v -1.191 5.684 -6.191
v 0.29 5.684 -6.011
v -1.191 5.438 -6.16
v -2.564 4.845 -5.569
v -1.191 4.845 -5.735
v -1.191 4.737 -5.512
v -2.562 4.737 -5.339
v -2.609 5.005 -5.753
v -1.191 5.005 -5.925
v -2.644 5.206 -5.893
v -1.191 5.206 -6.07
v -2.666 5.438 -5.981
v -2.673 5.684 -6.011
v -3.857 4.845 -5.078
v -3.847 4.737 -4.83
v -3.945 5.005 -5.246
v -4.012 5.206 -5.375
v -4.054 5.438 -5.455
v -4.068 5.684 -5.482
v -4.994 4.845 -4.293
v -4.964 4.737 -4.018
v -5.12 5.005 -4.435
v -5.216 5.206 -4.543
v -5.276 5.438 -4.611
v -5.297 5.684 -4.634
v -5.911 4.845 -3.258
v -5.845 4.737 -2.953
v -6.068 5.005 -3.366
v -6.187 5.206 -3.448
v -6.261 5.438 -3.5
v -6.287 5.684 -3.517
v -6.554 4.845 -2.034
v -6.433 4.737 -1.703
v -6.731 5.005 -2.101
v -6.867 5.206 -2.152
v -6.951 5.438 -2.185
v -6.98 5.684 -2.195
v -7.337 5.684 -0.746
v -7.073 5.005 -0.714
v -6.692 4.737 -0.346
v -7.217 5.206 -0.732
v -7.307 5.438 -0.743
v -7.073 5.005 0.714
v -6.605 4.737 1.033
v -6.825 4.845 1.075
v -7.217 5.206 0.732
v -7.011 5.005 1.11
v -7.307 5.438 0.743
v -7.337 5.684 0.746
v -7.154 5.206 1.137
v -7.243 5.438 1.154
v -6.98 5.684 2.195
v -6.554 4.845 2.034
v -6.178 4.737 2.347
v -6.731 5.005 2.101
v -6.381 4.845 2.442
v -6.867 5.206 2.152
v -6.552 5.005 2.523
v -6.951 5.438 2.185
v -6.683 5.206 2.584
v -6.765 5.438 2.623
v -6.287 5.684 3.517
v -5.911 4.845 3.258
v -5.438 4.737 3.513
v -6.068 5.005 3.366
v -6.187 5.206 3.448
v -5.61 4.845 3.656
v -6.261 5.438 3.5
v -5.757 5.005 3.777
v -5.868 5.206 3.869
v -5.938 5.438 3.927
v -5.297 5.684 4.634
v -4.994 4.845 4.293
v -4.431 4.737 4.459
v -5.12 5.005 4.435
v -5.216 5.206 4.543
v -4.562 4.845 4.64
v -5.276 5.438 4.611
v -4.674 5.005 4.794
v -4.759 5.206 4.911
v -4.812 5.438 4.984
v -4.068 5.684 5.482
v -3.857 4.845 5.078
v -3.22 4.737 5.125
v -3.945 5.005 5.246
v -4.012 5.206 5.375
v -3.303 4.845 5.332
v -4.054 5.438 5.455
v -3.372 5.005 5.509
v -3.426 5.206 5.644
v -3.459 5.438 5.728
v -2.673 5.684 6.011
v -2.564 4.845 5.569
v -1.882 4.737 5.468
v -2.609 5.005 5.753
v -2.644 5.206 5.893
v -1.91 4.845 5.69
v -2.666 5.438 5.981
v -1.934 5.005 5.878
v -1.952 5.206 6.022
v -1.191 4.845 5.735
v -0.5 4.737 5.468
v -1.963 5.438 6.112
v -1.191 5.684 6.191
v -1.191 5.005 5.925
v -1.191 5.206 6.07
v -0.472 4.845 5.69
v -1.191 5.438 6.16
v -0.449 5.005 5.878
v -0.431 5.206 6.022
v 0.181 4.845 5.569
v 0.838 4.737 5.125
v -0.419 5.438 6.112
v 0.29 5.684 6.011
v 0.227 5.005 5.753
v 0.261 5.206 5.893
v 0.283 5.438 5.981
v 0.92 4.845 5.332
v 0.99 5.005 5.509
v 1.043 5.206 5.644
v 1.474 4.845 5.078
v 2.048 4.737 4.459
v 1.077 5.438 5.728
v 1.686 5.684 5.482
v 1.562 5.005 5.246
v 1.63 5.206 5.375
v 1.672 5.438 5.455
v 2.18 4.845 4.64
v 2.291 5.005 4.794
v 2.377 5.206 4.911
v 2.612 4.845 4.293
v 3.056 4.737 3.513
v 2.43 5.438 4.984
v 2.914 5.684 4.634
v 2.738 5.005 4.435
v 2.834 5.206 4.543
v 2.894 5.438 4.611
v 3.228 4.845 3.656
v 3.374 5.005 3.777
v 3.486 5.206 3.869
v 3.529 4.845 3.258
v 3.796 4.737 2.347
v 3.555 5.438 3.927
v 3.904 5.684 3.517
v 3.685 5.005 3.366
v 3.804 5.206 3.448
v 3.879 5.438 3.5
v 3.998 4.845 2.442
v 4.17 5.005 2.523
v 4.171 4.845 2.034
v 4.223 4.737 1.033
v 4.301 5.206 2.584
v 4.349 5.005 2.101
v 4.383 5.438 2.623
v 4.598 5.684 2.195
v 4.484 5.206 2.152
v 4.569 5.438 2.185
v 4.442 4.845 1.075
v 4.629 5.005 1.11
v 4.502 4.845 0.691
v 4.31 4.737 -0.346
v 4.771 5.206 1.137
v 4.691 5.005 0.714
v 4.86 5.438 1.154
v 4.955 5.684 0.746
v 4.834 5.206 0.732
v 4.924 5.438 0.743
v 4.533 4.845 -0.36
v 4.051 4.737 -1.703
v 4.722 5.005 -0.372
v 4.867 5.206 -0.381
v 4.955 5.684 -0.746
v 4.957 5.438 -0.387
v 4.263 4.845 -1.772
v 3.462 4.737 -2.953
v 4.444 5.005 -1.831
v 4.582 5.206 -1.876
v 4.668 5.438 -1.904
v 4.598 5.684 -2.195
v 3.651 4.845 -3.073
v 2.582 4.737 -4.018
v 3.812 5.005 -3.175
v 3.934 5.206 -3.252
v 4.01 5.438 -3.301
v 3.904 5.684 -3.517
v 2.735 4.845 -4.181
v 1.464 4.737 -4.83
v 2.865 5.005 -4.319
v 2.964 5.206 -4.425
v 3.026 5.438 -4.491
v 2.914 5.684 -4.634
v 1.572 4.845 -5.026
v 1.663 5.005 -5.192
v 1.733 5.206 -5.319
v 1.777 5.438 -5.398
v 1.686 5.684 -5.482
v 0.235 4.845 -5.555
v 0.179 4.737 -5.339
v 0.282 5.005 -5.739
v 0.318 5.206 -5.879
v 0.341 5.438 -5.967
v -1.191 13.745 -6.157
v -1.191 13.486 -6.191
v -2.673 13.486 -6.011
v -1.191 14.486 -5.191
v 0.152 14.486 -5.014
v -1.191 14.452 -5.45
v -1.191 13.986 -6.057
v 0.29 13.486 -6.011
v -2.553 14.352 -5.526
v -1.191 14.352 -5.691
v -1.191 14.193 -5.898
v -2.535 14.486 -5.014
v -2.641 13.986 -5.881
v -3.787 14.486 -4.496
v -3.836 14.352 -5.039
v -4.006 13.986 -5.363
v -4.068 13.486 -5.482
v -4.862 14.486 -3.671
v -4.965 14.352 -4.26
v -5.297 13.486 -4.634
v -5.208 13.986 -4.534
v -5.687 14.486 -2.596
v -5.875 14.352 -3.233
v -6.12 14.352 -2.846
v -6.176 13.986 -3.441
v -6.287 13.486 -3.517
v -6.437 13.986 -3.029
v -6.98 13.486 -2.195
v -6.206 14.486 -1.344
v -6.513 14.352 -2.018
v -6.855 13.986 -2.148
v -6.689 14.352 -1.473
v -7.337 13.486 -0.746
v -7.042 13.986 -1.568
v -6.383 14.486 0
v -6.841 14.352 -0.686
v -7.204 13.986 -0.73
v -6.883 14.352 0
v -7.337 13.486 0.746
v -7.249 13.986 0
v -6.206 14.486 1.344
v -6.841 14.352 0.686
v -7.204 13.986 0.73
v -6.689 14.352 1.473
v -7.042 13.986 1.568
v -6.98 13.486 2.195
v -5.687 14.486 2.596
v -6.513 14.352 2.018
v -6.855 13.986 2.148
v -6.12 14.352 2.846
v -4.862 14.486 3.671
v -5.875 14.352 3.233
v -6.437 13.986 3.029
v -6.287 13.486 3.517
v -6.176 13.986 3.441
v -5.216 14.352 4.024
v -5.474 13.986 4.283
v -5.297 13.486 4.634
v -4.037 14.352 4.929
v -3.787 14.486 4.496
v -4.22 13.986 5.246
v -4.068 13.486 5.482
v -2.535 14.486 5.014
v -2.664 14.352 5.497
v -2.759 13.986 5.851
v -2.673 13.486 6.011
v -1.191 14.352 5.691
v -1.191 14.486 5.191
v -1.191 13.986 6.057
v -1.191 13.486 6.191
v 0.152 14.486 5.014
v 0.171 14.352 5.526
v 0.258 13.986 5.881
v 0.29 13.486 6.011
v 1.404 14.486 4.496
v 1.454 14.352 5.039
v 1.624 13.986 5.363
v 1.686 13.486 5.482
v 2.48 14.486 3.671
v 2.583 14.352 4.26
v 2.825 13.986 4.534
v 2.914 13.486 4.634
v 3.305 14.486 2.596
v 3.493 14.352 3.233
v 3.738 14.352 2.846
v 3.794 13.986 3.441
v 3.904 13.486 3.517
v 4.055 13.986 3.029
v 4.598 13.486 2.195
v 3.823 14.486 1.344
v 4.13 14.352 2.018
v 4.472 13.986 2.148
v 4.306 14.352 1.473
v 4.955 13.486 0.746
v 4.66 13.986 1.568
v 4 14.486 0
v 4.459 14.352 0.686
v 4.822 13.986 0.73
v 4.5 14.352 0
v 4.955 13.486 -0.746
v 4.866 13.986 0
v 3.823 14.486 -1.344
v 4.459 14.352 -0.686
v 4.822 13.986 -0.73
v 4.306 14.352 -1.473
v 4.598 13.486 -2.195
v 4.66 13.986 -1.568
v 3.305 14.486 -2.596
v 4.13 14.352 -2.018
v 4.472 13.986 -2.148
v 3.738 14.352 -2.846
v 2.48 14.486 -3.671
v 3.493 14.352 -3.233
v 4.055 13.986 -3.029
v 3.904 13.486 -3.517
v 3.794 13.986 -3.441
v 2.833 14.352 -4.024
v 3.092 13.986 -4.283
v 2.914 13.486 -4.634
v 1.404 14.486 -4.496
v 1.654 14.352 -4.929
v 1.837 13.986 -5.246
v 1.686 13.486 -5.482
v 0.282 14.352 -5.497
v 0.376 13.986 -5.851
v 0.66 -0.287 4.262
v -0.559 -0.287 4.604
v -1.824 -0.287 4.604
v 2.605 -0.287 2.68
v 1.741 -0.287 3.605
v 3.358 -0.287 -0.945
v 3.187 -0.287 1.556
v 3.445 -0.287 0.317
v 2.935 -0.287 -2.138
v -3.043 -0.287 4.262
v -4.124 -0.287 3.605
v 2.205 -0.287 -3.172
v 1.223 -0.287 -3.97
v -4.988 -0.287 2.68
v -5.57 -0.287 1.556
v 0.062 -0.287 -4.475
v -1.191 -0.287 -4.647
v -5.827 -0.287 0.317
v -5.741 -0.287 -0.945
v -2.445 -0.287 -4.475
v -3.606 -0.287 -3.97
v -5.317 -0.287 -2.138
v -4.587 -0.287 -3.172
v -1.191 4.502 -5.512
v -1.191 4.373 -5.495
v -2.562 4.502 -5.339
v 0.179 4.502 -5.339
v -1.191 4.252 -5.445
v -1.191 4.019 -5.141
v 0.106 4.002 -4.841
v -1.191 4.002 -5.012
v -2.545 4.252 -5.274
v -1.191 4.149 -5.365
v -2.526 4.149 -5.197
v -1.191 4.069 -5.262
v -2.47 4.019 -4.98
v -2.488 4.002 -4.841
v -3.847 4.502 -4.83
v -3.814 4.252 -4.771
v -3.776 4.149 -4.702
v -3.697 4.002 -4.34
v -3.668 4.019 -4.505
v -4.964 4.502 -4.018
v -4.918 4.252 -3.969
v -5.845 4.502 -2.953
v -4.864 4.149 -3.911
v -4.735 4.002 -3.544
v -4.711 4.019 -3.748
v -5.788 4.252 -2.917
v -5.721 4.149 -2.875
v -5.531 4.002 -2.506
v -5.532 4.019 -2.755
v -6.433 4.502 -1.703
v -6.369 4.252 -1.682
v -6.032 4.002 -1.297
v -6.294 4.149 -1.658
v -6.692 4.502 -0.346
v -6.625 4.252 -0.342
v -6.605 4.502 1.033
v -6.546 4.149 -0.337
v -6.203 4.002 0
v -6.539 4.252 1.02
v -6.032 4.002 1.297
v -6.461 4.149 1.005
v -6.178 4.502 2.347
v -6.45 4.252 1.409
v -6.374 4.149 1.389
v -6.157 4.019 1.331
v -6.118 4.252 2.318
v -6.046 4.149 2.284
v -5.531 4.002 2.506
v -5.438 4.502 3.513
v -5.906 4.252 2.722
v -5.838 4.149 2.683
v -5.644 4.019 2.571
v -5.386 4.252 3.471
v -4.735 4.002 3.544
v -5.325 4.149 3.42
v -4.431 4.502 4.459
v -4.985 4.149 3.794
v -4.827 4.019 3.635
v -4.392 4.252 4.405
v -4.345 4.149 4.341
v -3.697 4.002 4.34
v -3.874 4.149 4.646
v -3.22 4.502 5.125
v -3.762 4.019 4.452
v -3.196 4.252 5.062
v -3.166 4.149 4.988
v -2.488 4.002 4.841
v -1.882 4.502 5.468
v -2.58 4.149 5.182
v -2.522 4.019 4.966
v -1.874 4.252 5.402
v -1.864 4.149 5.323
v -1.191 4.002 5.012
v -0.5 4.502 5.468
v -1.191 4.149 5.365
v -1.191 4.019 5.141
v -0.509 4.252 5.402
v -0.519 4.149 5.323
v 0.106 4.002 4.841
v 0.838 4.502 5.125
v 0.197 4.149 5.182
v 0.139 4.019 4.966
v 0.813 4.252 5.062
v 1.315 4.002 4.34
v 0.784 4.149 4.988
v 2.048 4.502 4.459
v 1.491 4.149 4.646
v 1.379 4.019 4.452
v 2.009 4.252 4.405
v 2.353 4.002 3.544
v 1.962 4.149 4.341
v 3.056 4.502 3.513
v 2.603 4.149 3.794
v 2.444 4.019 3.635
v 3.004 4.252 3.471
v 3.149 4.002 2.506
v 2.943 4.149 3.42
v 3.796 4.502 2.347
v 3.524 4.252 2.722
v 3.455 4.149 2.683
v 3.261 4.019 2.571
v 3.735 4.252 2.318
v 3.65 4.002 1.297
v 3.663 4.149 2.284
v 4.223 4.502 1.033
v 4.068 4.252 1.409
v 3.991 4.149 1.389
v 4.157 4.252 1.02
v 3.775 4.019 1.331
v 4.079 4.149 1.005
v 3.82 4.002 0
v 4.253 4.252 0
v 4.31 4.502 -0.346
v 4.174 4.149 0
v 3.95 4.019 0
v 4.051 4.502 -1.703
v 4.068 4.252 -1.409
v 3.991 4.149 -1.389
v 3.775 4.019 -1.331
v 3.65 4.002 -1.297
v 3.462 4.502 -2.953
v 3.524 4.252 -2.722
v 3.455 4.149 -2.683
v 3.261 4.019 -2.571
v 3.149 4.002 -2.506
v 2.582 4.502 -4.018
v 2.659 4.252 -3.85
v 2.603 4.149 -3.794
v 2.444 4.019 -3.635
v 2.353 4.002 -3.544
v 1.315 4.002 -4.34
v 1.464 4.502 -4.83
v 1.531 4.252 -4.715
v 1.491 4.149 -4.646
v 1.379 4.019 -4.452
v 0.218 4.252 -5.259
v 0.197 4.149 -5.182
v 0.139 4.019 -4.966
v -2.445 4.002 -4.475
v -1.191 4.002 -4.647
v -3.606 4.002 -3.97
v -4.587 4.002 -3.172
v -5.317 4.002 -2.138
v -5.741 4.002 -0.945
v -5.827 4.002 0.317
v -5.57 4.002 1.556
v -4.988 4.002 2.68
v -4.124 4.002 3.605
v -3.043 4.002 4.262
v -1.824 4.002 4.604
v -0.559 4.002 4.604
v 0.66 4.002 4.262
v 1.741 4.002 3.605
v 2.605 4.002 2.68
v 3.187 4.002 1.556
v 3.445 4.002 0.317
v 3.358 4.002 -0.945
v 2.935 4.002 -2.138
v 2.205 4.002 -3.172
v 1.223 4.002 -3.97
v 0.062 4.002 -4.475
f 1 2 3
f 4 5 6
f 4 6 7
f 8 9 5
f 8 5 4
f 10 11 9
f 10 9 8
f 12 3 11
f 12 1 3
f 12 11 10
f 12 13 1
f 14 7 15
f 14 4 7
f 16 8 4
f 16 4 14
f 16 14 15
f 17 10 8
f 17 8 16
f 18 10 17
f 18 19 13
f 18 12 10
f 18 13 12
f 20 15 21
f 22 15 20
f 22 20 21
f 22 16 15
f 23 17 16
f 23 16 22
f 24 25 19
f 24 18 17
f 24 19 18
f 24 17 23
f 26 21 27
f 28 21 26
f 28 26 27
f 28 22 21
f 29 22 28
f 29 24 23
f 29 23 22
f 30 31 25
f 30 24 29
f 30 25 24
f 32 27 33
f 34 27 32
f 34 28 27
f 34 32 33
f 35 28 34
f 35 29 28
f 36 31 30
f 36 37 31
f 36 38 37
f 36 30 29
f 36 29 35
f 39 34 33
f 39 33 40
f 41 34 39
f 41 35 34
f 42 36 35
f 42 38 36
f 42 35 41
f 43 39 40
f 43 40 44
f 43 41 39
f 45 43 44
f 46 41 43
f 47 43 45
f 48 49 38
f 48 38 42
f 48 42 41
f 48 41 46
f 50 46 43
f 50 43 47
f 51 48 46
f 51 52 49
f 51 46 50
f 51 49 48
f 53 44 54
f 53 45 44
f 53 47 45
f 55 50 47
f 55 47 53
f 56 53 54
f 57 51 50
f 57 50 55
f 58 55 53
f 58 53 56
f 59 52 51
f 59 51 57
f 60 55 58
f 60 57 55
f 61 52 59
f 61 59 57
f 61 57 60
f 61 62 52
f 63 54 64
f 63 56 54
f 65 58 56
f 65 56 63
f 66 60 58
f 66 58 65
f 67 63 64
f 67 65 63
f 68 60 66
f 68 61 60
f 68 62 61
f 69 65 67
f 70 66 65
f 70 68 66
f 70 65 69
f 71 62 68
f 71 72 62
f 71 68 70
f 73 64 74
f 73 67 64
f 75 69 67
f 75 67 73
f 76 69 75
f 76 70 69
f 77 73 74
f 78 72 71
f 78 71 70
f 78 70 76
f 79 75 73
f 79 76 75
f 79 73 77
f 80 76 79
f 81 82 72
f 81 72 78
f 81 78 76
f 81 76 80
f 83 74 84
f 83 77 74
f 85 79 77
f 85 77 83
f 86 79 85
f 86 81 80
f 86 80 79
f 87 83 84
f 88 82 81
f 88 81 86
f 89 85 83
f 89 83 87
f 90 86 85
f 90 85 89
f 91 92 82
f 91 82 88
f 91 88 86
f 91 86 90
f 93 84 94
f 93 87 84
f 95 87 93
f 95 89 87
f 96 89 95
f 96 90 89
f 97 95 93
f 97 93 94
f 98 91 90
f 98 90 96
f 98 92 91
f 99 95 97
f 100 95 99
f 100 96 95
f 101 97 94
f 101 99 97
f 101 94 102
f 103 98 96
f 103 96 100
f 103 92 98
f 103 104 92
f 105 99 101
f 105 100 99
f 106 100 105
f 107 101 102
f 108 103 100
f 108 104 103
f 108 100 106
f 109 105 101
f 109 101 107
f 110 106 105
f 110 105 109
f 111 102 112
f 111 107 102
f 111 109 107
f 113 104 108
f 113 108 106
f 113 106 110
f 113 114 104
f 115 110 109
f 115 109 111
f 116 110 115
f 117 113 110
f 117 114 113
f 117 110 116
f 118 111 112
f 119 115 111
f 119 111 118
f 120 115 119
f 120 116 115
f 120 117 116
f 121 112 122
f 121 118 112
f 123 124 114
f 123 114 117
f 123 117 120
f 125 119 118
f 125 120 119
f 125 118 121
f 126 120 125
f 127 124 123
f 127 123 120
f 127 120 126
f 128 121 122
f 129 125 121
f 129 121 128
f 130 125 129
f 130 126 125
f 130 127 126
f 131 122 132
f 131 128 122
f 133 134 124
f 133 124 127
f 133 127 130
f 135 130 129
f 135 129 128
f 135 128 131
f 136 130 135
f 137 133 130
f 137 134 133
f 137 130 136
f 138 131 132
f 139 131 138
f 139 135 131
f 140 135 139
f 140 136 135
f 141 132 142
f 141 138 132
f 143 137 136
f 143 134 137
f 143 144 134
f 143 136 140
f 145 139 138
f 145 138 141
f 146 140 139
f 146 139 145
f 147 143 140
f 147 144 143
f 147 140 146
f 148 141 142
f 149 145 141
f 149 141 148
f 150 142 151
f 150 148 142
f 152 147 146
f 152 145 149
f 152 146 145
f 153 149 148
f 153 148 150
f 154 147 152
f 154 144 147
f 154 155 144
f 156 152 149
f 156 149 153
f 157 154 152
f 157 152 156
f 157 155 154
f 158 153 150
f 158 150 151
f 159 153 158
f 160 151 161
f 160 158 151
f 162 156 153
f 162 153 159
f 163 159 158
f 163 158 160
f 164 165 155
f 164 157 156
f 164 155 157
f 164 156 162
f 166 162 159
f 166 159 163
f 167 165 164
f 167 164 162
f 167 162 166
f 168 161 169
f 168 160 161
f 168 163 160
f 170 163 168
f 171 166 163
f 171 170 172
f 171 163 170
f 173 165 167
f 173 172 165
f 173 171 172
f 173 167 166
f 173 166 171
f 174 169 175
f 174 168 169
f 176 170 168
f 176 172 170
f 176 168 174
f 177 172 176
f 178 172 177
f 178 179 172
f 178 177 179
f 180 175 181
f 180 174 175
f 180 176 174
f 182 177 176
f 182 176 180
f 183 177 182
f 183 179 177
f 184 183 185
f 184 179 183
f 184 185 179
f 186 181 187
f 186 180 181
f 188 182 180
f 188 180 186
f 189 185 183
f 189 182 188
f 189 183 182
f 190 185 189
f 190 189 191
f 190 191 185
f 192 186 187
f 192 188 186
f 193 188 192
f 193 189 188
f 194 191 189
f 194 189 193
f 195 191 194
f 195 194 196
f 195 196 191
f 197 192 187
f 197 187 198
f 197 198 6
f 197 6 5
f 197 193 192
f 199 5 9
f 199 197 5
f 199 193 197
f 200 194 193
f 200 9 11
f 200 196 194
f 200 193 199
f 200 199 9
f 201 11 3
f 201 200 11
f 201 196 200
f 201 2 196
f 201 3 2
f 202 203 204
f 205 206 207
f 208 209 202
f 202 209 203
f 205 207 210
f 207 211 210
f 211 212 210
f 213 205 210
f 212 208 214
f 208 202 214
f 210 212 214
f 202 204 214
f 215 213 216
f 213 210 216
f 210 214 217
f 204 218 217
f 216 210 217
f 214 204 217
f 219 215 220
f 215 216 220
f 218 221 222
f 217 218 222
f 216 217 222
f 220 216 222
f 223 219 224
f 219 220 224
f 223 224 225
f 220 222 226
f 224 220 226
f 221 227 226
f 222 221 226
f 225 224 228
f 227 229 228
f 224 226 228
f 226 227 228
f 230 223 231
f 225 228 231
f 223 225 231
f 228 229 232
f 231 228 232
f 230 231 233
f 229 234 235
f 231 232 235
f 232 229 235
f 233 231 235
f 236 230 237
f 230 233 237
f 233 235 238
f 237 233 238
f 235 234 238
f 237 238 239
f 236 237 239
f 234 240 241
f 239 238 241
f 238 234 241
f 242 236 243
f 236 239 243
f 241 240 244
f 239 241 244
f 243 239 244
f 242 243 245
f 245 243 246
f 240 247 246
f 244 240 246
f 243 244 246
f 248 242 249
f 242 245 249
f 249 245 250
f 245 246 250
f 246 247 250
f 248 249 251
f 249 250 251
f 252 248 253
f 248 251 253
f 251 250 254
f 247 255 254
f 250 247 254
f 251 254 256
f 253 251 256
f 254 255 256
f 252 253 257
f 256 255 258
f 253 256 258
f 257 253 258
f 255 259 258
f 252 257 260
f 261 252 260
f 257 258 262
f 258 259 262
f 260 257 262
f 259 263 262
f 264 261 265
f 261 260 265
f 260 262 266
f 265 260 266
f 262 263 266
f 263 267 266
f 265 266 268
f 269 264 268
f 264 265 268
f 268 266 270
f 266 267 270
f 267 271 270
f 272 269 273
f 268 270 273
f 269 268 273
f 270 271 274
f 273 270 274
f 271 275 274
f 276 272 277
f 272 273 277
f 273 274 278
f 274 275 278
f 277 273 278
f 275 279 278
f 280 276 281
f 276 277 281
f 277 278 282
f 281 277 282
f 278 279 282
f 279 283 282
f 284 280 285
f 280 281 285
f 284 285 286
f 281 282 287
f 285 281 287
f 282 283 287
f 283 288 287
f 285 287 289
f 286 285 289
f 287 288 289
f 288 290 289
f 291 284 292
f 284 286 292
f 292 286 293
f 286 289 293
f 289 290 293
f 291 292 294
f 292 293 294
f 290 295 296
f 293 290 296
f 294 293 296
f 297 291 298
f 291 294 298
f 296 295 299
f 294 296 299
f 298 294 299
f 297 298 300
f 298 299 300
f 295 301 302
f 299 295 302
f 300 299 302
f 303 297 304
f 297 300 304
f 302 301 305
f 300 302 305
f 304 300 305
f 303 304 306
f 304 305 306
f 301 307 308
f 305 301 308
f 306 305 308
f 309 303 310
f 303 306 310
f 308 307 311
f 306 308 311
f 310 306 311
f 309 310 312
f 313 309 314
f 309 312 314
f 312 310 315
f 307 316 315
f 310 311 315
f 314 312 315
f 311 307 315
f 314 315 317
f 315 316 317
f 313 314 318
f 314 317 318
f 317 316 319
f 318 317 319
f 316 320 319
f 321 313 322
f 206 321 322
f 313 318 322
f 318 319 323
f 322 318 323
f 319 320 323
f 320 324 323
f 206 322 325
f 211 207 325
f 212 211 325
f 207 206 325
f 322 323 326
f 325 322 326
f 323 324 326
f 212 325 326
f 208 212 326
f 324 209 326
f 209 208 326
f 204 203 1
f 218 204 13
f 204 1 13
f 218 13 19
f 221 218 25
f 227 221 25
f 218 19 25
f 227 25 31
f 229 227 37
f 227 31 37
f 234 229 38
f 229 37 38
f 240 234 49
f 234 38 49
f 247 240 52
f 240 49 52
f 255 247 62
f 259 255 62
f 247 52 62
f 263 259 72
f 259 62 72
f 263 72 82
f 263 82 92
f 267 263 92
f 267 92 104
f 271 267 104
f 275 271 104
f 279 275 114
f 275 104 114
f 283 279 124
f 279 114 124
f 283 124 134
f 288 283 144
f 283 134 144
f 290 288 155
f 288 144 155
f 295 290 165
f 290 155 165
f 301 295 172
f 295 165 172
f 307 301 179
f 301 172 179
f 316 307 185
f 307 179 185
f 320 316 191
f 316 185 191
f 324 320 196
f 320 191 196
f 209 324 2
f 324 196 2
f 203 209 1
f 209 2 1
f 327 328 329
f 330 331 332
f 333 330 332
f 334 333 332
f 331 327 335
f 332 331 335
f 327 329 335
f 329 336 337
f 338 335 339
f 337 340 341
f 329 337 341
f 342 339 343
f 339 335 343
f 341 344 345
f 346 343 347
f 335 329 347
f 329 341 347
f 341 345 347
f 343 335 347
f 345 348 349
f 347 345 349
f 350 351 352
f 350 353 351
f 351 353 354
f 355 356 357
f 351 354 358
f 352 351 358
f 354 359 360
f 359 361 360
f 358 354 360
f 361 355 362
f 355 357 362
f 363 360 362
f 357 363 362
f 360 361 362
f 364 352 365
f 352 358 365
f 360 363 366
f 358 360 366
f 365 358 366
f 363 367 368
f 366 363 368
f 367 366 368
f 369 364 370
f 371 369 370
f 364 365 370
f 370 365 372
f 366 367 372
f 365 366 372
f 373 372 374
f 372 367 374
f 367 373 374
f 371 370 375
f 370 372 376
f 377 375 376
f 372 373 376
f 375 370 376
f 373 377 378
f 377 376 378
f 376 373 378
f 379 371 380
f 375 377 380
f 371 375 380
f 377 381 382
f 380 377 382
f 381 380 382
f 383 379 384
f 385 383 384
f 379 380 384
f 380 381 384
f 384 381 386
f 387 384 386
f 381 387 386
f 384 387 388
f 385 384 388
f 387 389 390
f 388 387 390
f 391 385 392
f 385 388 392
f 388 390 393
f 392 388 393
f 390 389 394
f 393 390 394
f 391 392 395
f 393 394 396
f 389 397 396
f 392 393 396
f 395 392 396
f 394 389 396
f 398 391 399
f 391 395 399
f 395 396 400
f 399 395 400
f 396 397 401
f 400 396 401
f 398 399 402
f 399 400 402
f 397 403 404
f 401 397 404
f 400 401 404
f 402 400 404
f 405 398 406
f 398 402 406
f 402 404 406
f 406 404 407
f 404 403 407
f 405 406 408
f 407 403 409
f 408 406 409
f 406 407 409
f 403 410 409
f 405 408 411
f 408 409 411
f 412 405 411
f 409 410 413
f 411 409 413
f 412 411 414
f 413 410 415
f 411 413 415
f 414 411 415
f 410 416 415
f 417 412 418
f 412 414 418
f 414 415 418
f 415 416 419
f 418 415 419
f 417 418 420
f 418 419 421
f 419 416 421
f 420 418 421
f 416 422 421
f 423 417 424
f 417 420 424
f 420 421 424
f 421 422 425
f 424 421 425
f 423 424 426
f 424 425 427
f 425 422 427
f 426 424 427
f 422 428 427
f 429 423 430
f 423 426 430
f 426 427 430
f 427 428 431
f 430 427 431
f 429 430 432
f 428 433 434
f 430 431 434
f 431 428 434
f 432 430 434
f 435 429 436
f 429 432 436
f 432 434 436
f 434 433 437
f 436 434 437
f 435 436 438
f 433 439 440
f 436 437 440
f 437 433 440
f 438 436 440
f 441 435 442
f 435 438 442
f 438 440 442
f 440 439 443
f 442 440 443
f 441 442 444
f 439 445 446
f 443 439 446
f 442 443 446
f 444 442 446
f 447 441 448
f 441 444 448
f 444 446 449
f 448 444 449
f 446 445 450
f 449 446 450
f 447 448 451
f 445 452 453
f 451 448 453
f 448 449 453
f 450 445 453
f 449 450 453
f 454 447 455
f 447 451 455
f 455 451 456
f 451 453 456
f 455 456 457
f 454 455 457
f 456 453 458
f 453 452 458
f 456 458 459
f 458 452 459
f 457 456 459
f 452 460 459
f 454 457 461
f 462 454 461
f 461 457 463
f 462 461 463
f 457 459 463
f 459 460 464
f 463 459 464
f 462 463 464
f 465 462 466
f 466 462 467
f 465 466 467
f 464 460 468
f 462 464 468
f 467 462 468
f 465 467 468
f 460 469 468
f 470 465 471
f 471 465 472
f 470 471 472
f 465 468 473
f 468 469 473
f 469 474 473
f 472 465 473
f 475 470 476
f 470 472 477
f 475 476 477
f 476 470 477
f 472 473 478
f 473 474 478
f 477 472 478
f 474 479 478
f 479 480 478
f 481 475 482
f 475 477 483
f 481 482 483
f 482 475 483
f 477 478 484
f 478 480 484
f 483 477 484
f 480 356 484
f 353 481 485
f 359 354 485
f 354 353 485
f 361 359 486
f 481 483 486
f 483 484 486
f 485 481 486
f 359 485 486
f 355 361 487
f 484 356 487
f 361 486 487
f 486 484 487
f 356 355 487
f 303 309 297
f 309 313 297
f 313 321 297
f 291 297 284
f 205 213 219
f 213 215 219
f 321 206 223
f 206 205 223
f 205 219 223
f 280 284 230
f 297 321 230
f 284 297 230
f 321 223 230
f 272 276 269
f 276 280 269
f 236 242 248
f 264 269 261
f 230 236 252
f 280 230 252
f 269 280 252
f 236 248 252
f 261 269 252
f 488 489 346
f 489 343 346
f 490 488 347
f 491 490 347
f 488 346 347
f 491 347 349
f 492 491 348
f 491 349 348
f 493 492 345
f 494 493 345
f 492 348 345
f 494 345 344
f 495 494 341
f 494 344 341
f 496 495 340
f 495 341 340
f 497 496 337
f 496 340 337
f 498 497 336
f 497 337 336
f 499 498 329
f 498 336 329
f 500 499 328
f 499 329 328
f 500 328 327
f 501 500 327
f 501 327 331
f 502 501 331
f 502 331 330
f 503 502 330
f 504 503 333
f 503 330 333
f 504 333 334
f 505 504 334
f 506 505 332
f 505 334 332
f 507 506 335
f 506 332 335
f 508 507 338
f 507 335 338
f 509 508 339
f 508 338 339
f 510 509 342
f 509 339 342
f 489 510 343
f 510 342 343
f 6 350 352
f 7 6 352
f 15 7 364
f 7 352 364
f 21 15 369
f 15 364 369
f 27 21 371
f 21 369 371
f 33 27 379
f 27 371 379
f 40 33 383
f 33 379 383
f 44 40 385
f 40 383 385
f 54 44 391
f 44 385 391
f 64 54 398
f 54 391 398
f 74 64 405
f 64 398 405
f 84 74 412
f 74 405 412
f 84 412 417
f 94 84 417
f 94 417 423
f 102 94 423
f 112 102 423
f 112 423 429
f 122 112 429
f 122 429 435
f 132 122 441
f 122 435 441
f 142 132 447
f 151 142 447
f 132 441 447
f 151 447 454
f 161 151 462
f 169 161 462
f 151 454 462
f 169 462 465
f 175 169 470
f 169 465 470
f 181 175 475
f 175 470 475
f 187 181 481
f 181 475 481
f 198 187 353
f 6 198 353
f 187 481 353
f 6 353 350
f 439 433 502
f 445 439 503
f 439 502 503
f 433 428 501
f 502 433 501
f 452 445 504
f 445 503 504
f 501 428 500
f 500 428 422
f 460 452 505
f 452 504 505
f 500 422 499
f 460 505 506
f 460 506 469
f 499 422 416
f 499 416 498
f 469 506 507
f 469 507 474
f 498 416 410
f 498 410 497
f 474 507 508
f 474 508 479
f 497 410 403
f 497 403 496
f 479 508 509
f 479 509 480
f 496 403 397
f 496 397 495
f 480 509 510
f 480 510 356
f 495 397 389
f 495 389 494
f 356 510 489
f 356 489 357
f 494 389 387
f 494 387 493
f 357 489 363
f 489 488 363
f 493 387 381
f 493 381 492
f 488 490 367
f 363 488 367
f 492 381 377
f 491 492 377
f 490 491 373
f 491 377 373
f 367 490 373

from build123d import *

# Parameters (mm, degrees)
FILLET_2_R = 1
FILLET_3_R = 1
FILLET_4_R = 0.5


with BuildPart() as part:
    # 草图1 → 旋转1 (revolve)
    with BuildSketch(Plane.XY, mode=Mode.PRIVATE) as revolve_1_sk:
        Polygon((-1.191258072, 14.485690889), (5, 14.485690889), (5, 4.736615531), (4.320409463, 4.736615531), (4.320409463, 4.0022434), (3.455669657, 4.0022434), (3.455669657, -0.286866039), (-1.191258072, -0.286866039), (-1.191258072, 4.0022434), (-1.191258072, 7.594094591), align=None)
    revolve(revolve_1_sk.sketch.rotate(Axis((-1.191258072, 7.594094591, 0), (0, 1, 0)), 90), axis=Axis((-1.191258072, 7.594094591, 0), (0, 1, 0)))

    # 圆角2
    fillet_2_edges = [part.edges().sort_by_distance(p)[0] for p in [
        (-1.191258072, 14.485690889, 6.191258072),
    ]]
    fillet(fillet_2_edges, radius=FILLET_2_R)

    # 圆角3
    # the kernel refuses this fillet: 1 mm, written as the material it takes off along each edge
    with BuildSketch(Plane(origin=(-1.191258072, 4.736615531, 0), x_dir=(0, 0, -1), z_dir=(1, 0, 0))) as fillet_3_piece_1:
        with BuildLine():
            CenterArc((5.191258072, 0.947279144), FILLET_3_R, 288.687689278, 71.312310722)
            Line((5.511667536, 0), (5.518075725, -0.018945583))
            ThreePointArc((5.518075725, -0.018945583), (5.851462804, -0.02), (6.191258072, -0.02))
            Line((6.191258072, -0.02), (6.211258072, 0))
            Line((6.211258072, 0), (6.211258072, 0.947279144))
            Line((6.211258072, 0.947279144), (6.191258072, 0.947279144))
        make_face()
    revolve(axis=Axis((-1.191258072, 4.736615531, 0), (0, 1, 0)), mode=Mode.SUBTRACT)

    # 圆角4
    fillet_4_edges = [part.edges().sort_by_distance(p)[0] for p in [
        (-1.191258072, 4.0022434, 5.511667536),
    ]]
    fillet(fillet_4_edges, radius=FILLET_4_R)


solid = part.part
